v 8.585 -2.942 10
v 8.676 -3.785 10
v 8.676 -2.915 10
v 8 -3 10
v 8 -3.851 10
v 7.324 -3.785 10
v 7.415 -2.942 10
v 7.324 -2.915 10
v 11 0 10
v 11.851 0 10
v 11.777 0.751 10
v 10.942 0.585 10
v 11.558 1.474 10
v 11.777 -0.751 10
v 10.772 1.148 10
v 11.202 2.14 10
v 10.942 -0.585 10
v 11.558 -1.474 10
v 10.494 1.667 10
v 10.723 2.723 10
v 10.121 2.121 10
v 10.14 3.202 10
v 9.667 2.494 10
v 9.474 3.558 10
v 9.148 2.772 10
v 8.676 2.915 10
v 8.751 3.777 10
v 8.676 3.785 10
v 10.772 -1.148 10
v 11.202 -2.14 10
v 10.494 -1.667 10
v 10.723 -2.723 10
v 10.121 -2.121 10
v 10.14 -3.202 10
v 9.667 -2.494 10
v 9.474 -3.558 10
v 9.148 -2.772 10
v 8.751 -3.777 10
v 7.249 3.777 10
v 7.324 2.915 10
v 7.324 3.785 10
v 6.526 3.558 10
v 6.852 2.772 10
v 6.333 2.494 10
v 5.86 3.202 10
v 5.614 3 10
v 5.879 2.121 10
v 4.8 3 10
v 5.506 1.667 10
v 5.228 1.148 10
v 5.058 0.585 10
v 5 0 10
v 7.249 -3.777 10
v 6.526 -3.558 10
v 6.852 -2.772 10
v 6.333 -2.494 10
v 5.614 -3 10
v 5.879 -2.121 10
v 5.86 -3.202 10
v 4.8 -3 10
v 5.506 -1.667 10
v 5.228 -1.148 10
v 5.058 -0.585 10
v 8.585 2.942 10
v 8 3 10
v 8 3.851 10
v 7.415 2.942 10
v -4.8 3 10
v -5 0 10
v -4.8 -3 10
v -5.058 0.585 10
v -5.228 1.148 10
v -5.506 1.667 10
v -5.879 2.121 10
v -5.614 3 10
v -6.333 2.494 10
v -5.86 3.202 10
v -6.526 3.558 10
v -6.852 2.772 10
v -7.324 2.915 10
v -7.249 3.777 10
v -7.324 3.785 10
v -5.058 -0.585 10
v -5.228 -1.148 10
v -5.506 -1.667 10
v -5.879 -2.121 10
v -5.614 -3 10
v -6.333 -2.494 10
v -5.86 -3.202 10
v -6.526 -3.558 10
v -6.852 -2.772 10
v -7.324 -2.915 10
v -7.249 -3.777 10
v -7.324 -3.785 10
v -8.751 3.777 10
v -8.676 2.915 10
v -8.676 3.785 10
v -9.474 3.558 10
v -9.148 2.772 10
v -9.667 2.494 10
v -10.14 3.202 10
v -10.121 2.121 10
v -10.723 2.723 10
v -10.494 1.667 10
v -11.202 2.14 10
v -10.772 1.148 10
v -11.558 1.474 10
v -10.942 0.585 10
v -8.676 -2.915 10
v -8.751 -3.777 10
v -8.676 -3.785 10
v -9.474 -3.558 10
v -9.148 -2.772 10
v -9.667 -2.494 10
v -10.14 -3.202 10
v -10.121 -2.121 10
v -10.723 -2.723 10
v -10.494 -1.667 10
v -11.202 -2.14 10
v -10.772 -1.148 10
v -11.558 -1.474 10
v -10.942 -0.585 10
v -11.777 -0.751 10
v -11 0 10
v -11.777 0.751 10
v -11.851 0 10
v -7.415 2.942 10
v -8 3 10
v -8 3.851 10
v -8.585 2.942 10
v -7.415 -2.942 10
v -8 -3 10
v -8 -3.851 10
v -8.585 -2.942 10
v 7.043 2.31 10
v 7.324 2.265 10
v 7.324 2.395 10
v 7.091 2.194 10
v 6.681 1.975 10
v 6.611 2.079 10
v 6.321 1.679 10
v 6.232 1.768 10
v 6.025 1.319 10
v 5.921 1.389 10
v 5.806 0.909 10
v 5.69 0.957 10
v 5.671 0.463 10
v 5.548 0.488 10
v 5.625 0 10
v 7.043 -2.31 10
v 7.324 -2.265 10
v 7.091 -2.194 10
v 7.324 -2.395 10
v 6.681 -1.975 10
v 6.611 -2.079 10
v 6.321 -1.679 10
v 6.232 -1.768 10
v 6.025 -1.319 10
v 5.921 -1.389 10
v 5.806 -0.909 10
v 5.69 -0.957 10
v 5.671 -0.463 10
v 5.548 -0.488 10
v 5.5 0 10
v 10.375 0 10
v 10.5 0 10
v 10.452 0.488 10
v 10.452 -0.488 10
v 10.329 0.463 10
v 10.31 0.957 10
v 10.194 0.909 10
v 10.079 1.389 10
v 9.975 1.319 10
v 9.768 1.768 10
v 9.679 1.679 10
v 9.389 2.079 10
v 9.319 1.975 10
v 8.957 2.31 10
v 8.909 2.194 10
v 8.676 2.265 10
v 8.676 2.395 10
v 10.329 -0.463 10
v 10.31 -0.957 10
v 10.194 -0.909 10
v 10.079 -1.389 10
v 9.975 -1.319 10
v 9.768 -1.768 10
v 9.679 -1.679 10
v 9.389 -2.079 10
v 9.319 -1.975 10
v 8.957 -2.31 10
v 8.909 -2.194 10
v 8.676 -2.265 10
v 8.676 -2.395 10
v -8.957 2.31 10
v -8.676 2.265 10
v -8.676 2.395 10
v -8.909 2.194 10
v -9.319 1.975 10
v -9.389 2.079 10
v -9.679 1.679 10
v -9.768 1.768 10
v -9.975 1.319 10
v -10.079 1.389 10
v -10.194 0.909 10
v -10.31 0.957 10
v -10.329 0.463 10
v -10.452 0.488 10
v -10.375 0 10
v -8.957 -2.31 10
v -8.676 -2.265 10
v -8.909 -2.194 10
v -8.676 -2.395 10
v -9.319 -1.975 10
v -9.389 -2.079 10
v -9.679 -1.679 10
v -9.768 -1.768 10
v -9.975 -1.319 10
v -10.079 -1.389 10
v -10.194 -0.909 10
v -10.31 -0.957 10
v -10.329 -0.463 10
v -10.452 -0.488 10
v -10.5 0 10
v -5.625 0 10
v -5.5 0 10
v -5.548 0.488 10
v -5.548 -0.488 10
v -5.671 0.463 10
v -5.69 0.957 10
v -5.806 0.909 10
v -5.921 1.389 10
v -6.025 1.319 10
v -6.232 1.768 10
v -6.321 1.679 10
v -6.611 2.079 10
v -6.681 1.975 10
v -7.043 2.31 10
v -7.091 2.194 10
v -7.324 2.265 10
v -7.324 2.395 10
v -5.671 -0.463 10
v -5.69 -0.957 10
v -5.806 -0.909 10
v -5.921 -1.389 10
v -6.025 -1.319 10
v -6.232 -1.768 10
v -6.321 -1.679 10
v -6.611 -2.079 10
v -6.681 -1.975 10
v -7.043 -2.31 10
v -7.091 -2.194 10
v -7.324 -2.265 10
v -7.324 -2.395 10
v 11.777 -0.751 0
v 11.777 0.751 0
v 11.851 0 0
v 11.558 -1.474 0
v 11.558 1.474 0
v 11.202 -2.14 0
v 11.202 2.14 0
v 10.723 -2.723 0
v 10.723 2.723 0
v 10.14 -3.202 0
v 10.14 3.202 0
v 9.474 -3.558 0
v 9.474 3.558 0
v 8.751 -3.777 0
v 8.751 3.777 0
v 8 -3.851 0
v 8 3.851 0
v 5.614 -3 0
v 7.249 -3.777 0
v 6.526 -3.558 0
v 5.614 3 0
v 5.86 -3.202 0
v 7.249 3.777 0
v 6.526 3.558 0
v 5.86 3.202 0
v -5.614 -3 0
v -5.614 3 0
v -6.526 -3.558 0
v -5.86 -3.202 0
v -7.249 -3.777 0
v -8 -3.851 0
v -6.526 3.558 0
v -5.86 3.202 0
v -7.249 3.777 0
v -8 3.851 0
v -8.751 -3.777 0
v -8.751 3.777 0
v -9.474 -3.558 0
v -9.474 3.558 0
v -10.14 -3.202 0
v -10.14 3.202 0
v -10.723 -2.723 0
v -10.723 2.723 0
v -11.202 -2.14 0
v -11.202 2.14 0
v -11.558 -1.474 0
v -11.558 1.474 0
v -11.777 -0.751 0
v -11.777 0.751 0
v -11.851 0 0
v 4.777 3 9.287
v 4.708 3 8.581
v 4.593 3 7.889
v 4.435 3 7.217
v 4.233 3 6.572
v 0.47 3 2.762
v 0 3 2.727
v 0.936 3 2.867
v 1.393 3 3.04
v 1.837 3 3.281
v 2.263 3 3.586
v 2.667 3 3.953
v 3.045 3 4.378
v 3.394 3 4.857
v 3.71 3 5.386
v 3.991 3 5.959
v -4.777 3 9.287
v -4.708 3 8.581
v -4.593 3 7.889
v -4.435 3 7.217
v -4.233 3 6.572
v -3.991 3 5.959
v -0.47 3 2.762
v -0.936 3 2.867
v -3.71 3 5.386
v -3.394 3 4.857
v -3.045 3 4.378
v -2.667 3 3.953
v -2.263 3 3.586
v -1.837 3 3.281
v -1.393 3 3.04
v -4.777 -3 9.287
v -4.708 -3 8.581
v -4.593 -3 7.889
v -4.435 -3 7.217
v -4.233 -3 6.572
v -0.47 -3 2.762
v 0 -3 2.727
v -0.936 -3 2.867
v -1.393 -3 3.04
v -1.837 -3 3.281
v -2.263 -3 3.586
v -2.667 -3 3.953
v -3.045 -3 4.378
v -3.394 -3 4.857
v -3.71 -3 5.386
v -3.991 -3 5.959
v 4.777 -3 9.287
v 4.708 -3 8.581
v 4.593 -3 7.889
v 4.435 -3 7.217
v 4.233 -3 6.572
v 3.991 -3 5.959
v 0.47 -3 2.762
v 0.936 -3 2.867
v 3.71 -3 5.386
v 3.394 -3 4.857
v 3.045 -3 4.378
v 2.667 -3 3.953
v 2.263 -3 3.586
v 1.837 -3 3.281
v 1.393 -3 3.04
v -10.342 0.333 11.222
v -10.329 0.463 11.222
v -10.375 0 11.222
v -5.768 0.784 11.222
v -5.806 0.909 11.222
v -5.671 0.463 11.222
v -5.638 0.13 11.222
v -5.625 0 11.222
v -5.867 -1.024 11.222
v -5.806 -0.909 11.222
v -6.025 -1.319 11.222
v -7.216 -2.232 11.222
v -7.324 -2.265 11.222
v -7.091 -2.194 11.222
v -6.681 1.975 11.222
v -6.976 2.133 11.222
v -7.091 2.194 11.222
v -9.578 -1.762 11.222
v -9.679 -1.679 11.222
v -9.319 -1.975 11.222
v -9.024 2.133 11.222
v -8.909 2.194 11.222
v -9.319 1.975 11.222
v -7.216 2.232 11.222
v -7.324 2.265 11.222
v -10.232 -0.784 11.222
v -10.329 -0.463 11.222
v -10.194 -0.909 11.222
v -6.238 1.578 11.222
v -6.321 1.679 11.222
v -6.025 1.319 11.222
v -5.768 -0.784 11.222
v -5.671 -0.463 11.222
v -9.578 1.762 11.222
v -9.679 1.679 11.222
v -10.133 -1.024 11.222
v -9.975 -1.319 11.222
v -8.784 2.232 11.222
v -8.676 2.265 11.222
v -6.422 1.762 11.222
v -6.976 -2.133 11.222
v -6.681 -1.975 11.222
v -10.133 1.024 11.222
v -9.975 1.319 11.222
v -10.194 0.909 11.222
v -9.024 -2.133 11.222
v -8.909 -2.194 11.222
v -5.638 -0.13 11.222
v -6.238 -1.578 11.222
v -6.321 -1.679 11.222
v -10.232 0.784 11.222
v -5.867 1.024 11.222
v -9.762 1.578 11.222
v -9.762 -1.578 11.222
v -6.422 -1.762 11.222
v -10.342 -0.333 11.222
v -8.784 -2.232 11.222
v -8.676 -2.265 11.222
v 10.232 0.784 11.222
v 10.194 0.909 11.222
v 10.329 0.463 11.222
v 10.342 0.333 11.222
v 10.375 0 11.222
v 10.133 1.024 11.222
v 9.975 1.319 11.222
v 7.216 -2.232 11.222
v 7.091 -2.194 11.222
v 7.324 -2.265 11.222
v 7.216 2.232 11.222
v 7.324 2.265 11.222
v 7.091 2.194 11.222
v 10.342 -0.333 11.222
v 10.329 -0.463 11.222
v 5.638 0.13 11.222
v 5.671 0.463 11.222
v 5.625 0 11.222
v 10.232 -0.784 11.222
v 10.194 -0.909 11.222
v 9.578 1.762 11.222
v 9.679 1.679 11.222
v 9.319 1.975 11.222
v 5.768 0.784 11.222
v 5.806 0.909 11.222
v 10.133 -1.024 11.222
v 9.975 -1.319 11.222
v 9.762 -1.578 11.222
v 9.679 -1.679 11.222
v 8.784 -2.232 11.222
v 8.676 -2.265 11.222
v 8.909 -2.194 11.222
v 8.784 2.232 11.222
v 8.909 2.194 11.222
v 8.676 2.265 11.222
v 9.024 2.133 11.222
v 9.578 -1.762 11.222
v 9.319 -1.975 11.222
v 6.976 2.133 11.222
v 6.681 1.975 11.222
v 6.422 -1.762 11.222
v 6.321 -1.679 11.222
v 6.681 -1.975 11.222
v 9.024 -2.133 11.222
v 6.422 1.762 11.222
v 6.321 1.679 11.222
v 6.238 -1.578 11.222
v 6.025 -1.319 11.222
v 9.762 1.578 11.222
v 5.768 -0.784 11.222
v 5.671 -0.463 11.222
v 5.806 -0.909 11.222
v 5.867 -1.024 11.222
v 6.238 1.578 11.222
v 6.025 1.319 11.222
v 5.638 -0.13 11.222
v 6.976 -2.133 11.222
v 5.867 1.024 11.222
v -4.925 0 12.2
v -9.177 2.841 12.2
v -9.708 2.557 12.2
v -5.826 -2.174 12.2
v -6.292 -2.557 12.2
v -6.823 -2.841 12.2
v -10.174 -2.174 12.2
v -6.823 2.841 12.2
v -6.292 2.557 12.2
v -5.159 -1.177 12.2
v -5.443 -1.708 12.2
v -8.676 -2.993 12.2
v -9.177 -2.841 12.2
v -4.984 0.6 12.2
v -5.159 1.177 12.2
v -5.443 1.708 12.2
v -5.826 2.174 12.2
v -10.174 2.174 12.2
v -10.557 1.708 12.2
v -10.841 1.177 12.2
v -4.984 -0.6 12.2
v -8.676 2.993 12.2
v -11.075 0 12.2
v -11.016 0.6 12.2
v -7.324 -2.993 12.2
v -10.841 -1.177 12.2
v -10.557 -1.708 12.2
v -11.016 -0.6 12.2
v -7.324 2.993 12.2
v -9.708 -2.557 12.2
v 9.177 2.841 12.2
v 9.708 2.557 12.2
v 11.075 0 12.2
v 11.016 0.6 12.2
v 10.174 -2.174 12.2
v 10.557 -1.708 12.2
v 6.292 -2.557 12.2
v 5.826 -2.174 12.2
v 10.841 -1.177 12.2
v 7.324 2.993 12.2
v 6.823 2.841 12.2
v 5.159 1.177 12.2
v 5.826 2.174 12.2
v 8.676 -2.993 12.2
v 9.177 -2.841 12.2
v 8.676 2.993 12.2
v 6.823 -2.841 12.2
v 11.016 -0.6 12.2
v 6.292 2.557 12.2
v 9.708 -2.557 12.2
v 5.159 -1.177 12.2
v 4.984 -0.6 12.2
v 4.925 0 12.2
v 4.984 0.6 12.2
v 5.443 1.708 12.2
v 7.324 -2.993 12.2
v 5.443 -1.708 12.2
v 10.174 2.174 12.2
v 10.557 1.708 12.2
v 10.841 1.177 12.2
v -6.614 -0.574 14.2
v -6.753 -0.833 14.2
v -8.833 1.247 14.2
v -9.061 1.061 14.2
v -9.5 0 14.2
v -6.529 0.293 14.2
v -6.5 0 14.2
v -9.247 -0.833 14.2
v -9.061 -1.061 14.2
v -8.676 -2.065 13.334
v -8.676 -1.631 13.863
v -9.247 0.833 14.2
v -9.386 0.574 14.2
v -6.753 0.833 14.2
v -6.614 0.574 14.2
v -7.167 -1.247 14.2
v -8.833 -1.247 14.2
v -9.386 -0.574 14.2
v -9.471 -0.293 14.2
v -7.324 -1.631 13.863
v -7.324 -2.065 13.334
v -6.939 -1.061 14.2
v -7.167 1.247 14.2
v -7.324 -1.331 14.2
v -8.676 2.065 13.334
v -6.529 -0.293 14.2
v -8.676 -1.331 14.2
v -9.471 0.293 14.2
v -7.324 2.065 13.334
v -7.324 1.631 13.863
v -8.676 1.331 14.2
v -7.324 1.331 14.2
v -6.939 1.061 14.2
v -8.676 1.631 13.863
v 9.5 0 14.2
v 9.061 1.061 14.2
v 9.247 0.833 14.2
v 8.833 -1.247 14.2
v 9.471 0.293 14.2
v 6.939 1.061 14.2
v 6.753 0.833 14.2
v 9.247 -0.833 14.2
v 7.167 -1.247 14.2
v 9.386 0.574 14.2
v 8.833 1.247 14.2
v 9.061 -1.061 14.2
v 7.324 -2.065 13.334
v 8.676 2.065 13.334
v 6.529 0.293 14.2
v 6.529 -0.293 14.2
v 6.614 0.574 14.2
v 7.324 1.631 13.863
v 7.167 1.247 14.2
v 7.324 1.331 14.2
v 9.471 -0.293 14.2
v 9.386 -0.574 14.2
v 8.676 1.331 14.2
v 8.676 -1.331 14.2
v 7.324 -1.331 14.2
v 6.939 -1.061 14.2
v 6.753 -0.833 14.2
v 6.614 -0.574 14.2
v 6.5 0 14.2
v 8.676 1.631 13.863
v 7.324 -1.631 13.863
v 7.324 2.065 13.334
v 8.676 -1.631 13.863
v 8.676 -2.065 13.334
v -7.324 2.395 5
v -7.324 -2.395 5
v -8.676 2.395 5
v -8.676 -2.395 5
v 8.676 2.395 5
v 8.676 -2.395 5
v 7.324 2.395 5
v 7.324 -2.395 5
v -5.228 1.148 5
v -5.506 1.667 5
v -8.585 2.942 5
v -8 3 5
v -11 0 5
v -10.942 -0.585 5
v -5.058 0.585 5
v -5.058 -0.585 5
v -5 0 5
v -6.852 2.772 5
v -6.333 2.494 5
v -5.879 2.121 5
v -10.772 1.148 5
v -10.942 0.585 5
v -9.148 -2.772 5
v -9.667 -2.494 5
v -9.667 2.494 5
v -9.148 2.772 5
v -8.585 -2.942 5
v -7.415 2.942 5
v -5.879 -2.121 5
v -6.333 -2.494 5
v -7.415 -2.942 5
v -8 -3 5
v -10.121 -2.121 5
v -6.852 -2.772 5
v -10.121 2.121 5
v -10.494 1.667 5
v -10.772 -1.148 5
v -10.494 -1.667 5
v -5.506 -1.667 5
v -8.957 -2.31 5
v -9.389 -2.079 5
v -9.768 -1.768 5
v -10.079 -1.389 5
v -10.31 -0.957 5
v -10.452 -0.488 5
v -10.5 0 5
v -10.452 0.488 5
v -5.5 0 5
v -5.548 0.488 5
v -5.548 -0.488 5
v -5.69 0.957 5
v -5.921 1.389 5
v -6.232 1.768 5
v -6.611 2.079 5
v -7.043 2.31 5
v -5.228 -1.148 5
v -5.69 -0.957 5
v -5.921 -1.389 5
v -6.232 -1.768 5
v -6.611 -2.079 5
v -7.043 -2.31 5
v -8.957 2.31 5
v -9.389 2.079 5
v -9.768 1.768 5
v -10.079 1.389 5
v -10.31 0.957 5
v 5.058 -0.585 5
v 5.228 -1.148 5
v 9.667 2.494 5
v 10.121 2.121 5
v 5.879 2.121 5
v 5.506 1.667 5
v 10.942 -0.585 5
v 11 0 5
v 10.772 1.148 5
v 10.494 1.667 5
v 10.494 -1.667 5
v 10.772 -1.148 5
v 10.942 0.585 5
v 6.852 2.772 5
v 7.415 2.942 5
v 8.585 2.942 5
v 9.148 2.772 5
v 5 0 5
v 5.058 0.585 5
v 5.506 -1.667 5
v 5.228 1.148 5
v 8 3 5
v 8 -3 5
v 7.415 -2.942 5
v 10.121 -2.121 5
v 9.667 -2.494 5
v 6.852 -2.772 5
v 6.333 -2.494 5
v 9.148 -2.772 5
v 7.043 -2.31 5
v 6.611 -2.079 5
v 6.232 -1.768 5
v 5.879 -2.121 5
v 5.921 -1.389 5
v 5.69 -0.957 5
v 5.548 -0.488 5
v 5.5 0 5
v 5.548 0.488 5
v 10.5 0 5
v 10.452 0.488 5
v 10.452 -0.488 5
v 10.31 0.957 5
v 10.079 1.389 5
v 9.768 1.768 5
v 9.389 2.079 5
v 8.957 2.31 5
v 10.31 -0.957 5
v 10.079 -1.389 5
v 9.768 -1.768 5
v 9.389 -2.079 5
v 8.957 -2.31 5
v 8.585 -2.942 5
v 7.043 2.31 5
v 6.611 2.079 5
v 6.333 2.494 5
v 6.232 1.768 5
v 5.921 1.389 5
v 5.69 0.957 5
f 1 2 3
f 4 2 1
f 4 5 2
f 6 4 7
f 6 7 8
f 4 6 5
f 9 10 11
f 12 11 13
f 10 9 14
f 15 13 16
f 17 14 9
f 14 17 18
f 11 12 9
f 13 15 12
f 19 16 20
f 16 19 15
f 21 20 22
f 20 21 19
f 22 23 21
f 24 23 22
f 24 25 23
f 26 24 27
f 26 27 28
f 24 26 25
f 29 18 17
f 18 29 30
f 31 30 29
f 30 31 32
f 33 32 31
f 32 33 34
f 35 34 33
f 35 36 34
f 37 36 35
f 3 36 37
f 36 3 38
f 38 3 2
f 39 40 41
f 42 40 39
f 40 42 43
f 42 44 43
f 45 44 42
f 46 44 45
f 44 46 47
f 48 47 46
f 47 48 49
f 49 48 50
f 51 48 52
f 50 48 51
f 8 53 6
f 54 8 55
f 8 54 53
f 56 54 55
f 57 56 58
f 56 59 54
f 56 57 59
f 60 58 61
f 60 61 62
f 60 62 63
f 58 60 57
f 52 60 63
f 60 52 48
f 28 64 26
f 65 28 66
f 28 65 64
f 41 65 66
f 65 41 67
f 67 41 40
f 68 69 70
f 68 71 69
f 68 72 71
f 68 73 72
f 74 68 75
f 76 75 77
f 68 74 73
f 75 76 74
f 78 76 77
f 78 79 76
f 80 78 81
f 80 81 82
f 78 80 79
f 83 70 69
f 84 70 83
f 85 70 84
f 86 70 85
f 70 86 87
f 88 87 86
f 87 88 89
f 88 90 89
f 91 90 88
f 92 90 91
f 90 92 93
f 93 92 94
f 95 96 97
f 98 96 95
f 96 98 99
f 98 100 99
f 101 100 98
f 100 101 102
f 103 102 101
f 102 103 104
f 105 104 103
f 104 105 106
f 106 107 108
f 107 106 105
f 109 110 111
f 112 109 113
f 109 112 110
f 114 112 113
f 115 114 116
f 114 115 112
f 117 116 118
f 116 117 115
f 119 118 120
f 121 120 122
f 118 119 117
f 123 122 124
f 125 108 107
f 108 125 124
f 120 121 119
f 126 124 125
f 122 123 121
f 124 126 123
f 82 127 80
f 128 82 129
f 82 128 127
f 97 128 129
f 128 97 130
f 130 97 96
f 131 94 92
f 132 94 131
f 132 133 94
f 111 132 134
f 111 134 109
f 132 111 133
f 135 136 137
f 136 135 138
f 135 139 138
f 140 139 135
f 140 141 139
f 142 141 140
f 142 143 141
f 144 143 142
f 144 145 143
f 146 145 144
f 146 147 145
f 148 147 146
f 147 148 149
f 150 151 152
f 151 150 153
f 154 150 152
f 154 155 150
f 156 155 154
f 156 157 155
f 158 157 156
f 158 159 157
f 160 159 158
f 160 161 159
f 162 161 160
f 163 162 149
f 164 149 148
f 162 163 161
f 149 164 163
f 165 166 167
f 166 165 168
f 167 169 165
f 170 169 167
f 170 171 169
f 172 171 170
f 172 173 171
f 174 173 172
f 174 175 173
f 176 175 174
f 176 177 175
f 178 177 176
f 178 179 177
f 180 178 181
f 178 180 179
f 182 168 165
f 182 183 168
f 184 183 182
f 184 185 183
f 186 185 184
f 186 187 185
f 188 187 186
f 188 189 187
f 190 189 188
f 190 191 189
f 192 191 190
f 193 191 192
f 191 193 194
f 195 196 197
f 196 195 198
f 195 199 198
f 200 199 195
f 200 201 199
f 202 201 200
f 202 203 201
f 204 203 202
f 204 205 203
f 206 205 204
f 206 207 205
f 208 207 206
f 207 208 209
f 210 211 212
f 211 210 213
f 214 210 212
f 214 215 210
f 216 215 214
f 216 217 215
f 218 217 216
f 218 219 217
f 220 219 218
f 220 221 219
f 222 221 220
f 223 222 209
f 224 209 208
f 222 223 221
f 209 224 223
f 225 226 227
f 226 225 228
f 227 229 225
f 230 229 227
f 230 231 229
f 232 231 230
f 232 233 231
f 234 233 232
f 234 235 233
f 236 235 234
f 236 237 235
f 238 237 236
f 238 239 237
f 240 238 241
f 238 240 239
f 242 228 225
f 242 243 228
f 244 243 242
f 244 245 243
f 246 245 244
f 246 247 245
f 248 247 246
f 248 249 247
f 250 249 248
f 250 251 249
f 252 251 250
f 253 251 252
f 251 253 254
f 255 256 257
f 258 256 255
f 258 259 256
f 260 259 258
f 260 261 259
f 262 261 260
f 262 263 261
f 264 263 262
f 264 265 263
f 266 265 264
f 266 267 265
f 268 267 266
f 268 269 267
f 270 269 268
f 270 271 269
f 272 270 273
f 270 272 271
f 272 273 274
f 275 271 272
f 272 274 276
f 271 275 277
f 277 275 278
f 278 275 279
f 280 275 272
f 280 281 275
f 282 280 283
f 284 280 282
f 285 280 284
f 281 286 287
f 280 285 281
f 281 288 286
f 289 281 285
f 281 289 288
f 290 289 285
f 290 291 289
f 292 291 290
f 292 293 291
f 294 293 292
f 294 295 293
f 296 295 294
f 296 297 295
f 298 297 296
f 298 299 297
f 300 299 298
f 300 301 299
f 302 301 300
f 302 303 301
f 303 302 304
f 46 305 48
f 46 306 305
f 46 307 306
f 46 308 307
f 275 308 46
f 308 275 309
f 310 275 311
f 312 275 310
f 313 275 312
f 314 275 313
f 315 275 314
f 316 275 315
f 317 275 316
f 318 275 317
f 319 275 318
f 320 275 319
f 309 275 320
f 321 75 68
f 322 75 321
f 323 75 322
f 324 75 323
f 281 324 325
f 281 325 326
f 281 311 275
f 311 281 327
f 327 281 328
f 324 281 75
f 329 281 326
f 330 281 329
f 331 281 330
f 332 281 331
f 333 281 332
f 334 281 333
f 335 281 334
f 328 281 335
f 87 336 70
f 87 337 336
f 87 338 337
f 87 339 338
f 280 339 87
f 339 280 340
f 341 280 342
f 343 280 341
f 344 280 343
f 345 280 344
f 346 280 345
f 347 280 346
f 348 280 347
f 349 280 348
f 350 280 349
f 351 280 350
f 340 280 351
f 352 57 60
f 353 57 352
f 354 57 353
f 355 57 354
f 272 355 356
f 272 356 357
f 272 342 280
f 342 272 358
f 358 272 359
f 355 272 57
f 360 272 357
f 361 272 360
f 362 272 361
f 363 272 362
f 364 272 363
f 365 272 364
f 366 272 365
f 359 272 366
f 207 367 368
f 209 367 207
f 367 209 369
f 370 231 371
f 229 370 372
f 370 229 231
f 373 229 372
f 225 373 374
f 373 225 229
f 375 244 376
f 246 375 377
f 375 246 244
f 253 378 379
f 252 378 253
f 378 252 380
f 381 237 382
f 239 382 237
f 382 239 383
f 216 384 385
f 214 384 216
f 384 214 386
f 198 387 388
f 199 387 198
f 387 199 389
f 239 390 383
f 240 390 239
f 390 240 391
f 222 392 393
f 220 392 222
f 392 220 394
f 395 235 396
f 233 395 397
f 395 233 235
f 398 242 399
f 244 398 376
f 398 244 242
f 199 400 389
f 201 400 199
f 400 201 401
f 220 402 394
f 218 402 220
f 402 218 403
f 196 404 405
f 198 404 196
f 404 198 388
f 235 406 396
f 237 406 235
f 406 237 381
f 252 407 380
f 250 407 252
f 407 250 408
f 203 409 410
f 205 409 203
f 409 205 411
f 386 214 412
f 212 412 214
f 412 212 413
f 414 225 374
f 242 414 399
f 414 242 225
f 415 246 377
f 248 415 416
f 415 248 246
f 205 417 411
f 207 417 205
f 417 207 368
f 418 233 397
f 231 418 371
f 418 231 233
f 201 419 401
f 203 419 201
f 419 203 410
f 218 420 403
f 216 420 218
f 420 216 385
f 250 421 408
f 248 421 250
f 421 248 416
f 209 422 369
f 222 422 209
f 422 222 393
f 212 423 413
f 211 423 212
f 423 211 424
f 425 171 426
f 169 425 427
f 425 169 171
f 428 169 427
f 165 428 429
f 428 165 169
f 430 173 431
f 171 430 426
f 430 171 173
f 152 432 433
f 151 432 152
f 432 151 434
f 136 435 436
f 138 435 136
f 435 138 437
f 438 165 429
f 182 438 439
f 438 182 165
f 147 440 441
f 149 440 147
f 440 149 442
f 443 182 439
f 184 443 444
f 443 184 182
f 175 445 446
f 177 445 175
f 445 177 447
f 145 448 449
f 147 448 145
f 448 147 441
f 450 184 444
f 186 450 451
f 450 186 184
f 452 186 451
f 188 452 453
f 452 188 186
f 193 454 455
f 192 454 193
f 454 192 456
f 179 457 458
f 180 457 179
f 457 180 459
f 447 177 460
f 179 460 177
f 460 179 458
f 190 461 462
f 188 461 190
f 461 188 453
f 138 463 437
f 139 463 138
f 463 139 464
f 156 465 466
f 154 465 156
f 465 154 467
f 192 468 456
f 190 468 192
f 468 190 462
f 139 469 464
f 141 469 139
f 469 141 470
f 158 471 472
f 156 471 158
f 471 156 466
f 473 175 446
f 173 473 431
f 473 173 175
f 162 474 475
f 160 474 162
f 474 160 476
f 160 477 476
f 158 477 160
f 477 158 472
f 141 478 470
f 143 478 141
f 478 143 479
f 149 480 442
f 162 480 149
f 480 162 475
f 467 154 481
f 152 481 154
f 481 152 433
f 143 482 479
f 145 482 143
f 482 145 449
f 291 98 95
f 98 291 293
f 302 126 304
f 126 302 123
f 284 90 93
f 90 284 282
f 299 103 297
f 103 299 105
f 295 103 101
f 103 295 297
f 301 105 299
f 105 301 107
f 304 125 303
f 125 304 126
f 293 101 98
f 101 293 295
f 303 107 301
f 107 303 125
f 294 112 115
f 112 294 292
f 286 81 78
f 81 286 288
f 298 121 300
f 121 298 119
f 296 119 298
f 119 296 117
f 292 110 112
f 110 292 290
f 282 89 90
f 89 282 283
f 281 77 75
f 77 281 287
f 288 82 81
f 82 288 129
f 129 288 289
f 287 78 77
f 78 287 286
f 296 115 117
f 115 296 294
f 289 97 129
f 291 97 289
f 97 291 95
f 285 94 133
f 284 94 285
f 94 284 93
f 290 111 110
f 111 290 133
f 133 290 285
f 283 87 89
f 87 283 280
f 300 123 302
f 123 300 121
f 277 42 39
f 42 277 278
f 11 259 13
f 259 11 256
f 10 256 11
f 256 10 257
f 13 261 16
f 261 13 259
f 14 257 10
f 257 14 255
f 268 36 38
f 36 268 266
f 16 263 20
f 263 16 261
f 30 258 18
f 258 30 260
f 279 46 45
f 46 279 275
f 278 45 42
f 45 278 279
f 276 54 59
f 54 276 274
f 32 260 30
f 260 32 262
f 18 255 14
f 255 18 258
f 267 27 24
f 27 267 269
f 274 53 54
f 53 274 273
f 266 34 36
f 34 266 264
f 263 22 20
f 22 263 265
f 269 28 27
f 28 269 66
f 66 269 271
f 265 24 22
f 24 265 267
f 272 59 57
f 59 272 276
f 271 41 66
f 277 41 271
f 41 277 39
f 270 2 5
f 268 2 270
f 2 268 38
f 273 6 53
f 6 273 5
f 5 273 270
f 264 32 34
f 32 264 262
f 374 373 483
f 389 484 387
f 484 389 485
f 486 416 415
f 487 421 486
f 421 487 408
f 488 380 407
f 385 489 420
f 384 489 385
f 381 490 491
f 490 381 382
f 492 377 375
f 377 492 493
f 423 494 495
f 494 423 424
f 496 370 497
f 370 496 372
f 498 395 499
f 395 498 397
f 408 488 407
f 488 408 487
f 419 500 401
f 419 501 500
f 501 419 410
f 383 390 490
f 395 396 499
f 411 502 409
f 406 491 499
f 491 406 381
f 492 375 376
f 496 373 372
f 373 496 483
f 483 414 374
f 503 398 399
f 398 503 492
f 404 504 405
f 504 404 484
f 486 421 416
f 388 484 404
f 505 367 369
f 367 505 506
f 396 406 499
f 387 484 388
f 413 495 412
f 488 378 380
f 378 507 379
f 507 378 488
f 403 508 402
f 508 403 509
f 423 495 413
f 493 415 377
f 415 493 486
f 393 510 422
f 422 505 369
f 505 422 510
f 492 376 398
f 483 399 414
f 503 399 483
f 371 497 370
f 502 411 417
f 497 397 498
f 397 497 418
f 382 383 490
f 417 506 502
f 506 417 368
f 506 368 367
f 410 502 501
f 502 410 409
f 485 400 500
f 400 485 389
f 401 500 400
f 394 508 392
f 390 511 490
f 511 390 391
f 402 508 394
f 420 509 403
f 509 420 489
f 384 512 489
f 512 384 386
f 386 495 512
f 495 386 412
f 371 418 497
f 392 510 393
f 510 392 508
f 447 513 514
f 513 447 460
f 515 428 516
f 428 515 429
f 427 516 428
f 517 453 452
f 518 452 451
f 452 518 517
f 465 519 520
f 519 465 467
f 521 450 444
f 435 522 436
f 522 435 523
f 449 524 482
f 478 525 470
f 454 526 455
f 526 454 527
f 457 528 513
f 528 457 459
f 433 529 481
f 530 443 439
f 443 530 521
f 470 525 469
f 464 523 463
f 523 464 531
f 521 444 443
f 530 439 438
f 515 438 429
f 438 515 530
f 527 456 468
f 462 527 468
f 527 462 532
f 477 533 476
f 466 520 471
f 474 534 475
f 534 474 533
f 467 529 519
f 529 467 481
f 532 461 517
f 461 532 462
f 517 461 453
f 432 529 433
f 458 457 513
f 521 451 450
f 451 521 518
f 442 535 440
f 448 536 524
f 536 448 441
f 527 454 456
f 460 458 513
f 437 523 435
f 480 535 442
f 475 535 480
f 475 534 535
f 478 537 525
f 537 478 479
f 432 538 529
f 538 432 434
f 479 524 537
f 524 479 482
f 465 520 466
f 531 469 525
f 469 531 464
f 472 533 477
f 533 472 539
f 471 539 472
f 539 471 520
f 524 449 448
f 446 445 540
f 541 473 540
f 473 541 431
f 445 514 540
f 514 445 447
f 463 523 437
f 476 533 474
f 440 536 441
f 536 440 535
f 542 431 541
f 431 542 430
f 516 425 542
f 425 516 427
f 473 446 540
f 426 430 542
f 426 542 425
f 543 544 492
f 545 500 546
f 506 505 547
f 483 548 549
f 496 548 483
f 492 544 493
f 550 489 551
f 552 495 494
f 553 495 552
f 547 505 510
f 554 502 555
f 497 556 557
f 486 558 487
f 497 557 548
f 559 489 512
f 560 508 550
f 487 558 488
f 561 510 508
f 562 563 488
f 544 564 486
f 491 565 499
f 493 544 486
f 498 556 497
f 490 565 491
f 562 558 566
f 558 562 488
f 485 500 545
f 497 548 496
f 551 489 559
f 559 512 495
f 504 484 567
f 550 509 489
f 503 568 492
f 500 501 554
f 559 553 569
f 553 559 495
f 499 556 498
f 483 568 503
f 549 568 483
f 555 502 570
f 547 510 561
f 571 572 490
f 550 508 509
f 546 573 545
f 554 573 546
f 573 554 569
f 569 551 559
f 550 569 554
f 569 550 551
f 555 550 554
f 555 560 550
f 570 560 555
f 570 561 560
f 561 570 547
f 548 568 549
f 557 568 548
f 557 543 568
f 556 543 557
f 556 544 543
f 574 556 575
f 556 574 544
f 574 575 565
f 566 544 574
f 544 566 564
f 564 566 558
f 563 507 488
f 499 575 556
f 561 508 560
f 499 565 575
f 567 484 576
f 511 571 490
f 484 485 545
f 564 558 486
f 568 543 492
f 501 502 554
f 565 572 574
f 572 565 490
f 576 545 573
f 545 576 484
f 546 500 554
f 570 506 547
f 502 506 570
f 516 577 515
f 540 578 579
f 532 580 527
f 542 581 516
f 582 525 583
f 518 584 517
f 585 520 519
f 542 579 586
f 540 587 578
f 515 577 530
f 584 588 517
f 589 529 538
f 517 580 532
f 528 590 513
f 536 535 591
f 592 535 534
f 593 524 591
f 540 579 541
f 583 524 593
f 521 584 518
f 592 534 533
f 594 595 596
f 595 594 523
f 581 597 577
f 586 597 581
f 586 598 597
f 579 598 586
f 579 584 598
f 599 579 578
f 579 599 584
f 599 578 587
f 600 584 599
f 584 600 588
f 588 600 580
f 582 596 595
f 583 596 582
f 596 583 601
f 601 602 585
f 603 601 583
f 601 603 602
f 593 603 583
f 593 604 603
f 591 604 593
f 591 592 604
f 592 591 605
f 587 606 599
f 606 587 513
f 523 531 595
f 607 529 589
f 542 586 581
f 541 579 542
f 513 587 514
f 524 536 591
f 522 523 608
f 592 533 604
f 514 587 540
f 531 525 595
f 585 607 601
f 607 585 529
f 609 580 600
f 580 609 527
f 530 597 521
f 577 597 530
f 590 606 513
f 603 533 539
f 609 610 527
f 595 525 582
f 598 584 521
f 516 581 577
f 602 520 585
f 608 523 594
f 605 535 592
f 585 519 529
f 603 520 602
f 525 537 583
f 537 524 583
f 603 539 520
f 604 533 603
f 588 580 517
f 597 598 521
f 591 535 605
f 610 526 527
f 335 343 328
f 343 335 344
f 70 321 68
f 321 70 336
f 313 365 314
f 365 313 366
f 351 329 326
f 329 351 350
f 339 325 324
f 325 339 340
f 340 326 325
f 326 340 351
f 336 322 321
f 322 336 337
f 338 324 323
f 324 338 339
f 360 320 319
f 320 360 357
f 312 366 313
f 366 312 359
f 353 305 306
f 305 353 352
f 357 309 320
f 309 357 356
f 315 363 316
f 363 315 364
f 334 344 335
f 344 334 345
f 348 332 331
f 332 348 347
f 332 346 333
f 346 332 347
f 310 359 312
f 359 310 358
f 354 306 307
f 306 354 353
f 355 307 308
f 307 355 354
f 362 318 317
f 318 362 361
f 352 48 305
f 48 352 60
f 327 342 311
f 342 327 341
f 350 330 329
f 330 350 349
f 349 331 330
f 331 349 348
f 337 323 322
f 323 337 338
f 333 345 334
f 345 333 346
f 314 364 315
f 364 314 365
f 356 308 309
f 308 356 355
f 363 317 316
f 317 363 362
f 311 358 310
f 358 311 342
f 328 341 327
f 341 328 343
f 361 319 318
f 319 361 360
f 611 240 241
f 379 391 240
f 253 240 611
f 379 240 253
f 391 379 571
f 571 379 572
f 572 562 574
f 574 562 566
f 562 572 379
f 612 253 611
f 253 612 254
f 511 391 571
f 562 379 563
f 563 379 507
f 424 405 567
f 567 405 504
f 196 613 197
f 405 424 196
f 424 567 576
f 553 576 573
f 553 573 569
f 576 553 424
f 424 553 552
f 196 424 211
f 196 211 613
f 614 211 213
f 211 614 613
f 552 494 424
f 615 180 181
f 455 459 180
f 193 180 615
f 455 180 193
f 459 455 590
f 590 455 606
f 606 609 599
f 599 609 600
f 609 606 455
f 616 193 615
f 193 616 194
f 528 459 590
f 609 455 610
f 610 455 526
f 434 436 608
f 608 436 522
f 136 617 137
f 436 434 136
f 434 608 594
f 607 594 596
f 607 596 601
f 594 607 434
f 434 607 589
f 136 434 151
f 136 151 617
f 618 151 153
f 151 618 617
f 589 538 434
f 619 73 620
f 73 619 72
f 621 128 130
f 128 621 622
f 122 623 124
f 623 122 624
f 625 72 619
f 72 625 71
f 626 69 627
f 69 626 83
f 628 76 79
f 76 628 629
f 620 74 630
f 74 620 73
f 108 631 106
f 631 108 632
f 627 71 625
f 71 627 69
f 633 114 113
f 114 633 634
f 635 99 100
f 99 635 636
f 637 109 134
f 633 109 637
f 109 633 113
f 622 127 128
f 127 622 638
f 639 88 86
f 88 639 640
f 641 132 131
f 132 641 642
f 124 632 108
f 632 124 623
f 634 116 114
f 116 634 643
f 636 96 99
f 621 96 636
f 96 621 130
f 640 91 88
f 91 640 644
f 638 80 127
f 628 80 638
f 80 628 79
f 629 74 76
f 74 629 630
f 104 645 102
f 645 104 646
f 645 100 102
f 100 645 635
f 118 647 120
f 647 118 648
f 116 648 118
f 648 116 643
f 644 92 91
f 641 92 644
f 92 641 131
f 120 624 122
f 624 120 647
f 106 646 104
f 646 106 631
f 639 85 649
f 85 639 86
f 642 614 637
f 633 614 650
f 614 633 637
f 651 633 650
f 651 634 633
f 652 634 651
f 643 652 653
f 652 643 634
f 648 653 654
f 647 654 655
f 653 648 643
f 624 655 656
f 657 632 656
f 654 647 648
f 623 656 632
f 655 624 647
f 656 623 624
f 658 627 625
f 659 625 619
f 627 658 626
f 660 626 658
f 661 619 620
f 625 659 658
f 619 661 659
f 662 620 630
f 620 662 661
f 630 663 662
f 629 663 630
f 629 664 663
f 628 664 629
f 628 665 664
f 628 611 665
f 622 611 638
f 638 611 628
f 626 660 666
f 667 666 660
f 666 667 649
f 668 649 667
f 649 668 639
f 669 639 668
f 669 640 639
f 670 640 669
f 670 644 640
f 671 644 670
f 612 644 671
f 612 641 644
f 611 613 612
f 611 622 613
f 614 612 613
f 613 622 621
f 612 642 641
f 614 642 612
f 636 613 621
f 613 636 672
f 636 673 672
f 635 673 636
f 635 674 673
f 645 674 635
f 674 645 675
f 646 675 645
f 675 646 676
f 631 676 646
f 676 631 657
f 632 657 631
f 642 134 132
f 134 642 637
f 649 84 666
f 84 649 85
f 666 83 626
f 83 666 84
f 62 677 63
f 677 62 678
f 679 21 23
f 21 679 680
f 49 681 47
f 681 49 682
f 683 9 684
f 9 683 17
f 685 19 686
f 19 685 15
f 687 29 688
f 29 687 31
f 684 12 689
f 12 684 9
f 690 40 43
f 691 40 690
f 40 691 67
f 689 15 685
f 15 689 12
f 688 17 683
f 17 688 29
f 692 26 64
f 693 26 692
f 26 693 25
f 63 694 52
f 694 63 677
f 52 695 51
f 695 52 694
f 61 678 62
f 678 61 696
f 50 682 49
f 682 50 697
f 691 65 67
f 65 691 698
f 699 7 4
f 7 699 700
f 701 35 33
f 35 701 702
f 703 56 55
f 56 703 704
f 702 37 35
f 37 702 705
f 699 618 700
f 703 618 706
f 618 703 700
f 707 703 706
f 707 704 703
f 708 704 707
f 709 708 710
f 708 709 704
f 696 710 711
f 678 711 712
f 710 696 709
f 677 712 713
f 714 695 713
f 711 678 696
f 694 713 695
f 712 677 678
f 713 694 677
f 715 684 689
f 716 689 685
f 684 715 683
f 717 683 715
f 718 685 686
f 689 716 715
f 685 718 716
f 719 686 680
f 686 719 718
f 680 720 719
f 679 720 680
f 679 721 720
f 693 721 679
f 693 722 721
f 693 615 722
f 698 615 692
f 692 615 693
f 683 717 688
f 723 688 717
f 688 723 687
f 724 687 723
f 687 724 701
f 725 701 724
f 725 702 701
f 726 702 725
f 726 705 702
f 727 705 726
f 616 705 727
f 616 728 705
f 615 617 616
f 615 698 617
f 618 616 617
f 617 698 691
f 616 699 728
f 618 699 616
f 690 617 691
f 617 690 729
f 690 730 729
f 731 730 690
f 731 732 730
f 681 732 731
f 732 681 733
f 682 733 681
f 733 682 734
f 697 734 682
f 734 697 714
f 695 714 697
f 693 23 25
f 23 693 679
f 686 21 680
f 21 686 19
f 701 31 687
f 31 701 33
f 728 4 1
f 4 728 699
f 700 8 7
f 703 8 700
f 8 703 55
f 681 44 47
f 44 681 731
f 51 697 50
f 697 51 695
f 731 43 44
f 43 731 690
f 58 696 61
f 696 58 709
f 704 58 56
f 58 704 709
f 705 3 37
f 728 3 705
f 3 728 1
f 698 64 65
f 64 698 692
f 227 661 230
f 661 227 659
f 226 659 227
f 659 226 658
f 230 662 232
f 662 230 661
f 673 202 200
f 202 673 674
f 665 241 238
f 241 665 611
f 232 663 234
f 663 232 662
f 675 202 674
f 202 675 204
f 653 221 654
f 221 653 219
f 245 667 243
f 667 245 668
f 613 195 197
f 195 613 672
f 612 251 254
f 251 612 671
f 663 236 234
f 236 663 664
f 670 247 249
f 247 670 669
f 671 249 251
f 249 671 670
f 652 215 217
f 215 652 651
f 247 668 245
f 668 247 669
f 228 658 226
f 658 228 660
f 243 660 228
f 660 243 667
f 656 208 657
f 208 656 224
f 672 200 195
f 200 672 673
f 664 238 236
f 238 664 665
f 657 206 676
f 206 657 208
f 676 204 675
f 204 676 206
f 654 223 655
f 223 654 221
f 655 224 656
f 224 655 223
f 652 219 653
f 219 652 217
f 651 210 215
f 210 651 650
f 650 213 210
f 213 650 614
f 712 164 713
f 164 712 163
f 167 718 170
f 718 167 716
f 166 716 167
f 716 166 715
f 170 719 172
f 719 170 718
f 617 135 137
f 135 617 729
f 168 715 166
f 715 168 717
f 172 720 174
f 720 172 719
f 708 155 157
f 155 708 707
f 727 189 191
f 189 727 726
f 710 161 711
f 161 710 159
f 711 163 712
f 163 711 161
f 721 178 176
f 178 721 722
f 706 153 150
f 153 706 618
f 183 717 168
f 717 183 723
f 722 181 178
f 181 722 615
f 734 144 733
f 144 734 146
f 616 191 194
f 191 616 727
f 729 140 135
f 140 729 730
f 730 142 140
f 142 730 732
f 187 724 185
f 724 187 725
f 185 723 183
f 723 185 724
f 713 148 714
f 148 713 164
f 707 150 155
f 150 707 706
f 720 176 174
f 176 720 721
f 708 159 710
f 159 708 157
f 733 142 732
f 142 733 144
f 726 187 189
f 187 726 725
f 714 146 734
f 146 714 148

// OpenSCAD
//////////////////////////////////////////////
// Parametric Cable Clip for holed plates by Christoph Queck, chris@q3d.de, wwww.q3d.de
// April 2016
// Creative Commons Attribution-ShareAlike 4.0 International (CC BY-SA 4.0)
// http://creativecommons.org/licenses/by-sa/4.0/
/////////////////////////////////////////////

//Hole Distance in mm (I recommend skipping one hole)
Hole_Distance=16;

abstand = Hole_Distance;

//Hole Diameter in mm
Hole_Diameter=5;

loch=Hole_Diameter;

//Plate Thickness in mm
Thickness=2.2;

dicke=Thickness;

//Height in mm
Height=10;

hoehe=Height;

//Multiplier for fitting the Plugs
Fitting_multiplier=1;//[0:0.1:2]

fitting=(Fitting_multiplier/8)+0.9;
//Amount of clips
Amount=1;//[1, 4, 9]

///////////////////not yet implemented, stiffness multiplier
//Stiffness=1;

//stif=Stiffness;

if (Amount==1){
    clip();
    }
    
if (Amount==4){
    translate([(-abstand-loch*1.5-4)/2,(loch/1.5+2),0])clip();
    translate([-(-abstand-loch*1.5-4)/2,(loch/1.5+2),0])clip();
    translate([(-abstand-loch*1.5-4)/2,-(loch/1.5+2),0])clip();
    translate([-(-abstand-loch*1.5-4)/2,-(loch/1.5+2),0])clip();
    }

if (Amount==9){
    translate([0,(loch*1.2+4),0])clip();
    translate([0,0,0])clip();
    translate([0,-(loch*1.2+4),0])clip();
    
    translate([(-abstand-loch*1.5-4),(loch*1.2+4),0])clip();
    translate([(-abstand-loch*1.5-4),0,0])clip();
    translate([(-abstand-loch*1.5-4),-(loch*1.2+4),0])clip();
    
       translate([-(-abstand-loch*1.5-4),(loch*1.2+4),0])clip();
    translate([-(-abstand-loch*1.5-4),0,0])clip();
    translate([-(-abstand-loch*1.5-4),-(loch*1.2+4),0])clip();
    }


module clip(){
union(){
	difference(){
		union(){
			//body
			translate([0,0,hoehe/2])cube([abstand+2,loch*6/5,hoehe],center=true); 
			//stiftedurch
			translate([-abstand/2,0,hoehe])cylinder(r=loch/2*0.95,h=dicke*2,center=true,$fn=32);
			translate([abstand/2,0,hoehe])cylinder(r=loch/2*0.95,h=dicke*2,center=true,$fn=32);
			//stuetze
			translate([-abstand/2,0,hoehe/2])cylinder(r=(loch/2+loch/3.7),h=hoehe,center=true,$fn=32);
			translate([abstand/2,0,hoehe/2])cylinder(r=(loch/2+loch/3.7),h=hoehe,center=true,$fn=32);
			//schraegeunten
			translate([-abstand/2,0,hoehe+dicke*0.5])cylinder(r1=loch/2-loch/5,r2=loch/5*3*fitting,h=dicke,center=true,$fn=32);
			translate([abstand/2,0,hoehe+dicke*0.5])cylinder(r1=loch/2-loch/5,r2=loch/5*3*fitting,h=dicke,center=true,$fn=32);
			//schraegeoben
			translate([-abstand/2,0,hoehe+(dicke+1)])cylinder(r1=loch/5*3*fitting,r2=loch/2-loch/5,h=2,center=true,$fn=32);
			translate([abstand/2,0,hoehe+(dicke+1)])cylinder(r1=loch/5*3*fitting,r2=loch/2-loch/5,h=2,center=true,$fn=32);

		}
		union(){
			//kabelausschnitt
			difference(){
				translate([0,0,hoehe])scale([1,1,hoehe/10+(1-abstand/33)])rotate([90,0,0])cylinder(r=abstand/3.3333333,h=loch*2,$fn=64,center=true);
				translate([-abstand/2,0,hoehe/2])cylinder(r=loch/2,h=hoehe+1,center=true,$fn=32);
				translate([abstand/2,0,hoehe/2])cylinder(r=loch/2,h=hoehe+1,center=true,$fn=32);
				translate([-abstand/2,-loch/2,hoehe+0.1])cube([abstand,loch,hoehe]);
			}
			//clip ausschnitt
			translate([-abstand/2,0,hoehe+dicke*5])cube([loch/3.7,loch*2,dicke*10],center=true);
			translate([abstand/2,0,hoehe+dicke*5])cube([loch/3.7,loch*2,dicke*10],center=true);
			//clip verlaengerung
			union(){
				intersection(){
					union(){
						translate([-abstand/2,0,hoehe-loch*1])cube([loch/3.7,loch*2,loch*10],center=true);
						translate([abstand/2,0,hoehe-loch*1])cube([loch/3.7,loch*2,loch*10],center=true);
					}
					union(){              
						translate([-abstand/2,0,hoehe-loch/2])cylinder(r=loch/5*3,h=loch,center=true,$fn=32);
						translate([abstand/2,0,hoehe-loch/2])cylinder(r=loch/5*3,h=loch,center=true,$fn=32);
					}
				}
				difference(){
					union(){
						translate([-abstand/2,0,hoehe-loch/2])cylinder(r=loch/5*3,h=loch,center=true,$fn=32);
						translate([abstand/2,0,hoehe-loch/2])cylinder(r=loch/5*3,h=loch,center=true,$fn=32);
					}
					union(){
						translate([-abstand/2,0,hoehe-loch/2])cylinder(r=loch/2,h=loch,center=true,$fn=32);
						translate([abstand/2,0,hoehe-loch/2])cylinder(r=loch/2,h=loch,center=true,$fn=32);

					}
				}
			}          
		}
	}
	//brueckeunten
	translate([0,0,1])cube([abstand+2,loch*6/5,2],center=true);
}
}
